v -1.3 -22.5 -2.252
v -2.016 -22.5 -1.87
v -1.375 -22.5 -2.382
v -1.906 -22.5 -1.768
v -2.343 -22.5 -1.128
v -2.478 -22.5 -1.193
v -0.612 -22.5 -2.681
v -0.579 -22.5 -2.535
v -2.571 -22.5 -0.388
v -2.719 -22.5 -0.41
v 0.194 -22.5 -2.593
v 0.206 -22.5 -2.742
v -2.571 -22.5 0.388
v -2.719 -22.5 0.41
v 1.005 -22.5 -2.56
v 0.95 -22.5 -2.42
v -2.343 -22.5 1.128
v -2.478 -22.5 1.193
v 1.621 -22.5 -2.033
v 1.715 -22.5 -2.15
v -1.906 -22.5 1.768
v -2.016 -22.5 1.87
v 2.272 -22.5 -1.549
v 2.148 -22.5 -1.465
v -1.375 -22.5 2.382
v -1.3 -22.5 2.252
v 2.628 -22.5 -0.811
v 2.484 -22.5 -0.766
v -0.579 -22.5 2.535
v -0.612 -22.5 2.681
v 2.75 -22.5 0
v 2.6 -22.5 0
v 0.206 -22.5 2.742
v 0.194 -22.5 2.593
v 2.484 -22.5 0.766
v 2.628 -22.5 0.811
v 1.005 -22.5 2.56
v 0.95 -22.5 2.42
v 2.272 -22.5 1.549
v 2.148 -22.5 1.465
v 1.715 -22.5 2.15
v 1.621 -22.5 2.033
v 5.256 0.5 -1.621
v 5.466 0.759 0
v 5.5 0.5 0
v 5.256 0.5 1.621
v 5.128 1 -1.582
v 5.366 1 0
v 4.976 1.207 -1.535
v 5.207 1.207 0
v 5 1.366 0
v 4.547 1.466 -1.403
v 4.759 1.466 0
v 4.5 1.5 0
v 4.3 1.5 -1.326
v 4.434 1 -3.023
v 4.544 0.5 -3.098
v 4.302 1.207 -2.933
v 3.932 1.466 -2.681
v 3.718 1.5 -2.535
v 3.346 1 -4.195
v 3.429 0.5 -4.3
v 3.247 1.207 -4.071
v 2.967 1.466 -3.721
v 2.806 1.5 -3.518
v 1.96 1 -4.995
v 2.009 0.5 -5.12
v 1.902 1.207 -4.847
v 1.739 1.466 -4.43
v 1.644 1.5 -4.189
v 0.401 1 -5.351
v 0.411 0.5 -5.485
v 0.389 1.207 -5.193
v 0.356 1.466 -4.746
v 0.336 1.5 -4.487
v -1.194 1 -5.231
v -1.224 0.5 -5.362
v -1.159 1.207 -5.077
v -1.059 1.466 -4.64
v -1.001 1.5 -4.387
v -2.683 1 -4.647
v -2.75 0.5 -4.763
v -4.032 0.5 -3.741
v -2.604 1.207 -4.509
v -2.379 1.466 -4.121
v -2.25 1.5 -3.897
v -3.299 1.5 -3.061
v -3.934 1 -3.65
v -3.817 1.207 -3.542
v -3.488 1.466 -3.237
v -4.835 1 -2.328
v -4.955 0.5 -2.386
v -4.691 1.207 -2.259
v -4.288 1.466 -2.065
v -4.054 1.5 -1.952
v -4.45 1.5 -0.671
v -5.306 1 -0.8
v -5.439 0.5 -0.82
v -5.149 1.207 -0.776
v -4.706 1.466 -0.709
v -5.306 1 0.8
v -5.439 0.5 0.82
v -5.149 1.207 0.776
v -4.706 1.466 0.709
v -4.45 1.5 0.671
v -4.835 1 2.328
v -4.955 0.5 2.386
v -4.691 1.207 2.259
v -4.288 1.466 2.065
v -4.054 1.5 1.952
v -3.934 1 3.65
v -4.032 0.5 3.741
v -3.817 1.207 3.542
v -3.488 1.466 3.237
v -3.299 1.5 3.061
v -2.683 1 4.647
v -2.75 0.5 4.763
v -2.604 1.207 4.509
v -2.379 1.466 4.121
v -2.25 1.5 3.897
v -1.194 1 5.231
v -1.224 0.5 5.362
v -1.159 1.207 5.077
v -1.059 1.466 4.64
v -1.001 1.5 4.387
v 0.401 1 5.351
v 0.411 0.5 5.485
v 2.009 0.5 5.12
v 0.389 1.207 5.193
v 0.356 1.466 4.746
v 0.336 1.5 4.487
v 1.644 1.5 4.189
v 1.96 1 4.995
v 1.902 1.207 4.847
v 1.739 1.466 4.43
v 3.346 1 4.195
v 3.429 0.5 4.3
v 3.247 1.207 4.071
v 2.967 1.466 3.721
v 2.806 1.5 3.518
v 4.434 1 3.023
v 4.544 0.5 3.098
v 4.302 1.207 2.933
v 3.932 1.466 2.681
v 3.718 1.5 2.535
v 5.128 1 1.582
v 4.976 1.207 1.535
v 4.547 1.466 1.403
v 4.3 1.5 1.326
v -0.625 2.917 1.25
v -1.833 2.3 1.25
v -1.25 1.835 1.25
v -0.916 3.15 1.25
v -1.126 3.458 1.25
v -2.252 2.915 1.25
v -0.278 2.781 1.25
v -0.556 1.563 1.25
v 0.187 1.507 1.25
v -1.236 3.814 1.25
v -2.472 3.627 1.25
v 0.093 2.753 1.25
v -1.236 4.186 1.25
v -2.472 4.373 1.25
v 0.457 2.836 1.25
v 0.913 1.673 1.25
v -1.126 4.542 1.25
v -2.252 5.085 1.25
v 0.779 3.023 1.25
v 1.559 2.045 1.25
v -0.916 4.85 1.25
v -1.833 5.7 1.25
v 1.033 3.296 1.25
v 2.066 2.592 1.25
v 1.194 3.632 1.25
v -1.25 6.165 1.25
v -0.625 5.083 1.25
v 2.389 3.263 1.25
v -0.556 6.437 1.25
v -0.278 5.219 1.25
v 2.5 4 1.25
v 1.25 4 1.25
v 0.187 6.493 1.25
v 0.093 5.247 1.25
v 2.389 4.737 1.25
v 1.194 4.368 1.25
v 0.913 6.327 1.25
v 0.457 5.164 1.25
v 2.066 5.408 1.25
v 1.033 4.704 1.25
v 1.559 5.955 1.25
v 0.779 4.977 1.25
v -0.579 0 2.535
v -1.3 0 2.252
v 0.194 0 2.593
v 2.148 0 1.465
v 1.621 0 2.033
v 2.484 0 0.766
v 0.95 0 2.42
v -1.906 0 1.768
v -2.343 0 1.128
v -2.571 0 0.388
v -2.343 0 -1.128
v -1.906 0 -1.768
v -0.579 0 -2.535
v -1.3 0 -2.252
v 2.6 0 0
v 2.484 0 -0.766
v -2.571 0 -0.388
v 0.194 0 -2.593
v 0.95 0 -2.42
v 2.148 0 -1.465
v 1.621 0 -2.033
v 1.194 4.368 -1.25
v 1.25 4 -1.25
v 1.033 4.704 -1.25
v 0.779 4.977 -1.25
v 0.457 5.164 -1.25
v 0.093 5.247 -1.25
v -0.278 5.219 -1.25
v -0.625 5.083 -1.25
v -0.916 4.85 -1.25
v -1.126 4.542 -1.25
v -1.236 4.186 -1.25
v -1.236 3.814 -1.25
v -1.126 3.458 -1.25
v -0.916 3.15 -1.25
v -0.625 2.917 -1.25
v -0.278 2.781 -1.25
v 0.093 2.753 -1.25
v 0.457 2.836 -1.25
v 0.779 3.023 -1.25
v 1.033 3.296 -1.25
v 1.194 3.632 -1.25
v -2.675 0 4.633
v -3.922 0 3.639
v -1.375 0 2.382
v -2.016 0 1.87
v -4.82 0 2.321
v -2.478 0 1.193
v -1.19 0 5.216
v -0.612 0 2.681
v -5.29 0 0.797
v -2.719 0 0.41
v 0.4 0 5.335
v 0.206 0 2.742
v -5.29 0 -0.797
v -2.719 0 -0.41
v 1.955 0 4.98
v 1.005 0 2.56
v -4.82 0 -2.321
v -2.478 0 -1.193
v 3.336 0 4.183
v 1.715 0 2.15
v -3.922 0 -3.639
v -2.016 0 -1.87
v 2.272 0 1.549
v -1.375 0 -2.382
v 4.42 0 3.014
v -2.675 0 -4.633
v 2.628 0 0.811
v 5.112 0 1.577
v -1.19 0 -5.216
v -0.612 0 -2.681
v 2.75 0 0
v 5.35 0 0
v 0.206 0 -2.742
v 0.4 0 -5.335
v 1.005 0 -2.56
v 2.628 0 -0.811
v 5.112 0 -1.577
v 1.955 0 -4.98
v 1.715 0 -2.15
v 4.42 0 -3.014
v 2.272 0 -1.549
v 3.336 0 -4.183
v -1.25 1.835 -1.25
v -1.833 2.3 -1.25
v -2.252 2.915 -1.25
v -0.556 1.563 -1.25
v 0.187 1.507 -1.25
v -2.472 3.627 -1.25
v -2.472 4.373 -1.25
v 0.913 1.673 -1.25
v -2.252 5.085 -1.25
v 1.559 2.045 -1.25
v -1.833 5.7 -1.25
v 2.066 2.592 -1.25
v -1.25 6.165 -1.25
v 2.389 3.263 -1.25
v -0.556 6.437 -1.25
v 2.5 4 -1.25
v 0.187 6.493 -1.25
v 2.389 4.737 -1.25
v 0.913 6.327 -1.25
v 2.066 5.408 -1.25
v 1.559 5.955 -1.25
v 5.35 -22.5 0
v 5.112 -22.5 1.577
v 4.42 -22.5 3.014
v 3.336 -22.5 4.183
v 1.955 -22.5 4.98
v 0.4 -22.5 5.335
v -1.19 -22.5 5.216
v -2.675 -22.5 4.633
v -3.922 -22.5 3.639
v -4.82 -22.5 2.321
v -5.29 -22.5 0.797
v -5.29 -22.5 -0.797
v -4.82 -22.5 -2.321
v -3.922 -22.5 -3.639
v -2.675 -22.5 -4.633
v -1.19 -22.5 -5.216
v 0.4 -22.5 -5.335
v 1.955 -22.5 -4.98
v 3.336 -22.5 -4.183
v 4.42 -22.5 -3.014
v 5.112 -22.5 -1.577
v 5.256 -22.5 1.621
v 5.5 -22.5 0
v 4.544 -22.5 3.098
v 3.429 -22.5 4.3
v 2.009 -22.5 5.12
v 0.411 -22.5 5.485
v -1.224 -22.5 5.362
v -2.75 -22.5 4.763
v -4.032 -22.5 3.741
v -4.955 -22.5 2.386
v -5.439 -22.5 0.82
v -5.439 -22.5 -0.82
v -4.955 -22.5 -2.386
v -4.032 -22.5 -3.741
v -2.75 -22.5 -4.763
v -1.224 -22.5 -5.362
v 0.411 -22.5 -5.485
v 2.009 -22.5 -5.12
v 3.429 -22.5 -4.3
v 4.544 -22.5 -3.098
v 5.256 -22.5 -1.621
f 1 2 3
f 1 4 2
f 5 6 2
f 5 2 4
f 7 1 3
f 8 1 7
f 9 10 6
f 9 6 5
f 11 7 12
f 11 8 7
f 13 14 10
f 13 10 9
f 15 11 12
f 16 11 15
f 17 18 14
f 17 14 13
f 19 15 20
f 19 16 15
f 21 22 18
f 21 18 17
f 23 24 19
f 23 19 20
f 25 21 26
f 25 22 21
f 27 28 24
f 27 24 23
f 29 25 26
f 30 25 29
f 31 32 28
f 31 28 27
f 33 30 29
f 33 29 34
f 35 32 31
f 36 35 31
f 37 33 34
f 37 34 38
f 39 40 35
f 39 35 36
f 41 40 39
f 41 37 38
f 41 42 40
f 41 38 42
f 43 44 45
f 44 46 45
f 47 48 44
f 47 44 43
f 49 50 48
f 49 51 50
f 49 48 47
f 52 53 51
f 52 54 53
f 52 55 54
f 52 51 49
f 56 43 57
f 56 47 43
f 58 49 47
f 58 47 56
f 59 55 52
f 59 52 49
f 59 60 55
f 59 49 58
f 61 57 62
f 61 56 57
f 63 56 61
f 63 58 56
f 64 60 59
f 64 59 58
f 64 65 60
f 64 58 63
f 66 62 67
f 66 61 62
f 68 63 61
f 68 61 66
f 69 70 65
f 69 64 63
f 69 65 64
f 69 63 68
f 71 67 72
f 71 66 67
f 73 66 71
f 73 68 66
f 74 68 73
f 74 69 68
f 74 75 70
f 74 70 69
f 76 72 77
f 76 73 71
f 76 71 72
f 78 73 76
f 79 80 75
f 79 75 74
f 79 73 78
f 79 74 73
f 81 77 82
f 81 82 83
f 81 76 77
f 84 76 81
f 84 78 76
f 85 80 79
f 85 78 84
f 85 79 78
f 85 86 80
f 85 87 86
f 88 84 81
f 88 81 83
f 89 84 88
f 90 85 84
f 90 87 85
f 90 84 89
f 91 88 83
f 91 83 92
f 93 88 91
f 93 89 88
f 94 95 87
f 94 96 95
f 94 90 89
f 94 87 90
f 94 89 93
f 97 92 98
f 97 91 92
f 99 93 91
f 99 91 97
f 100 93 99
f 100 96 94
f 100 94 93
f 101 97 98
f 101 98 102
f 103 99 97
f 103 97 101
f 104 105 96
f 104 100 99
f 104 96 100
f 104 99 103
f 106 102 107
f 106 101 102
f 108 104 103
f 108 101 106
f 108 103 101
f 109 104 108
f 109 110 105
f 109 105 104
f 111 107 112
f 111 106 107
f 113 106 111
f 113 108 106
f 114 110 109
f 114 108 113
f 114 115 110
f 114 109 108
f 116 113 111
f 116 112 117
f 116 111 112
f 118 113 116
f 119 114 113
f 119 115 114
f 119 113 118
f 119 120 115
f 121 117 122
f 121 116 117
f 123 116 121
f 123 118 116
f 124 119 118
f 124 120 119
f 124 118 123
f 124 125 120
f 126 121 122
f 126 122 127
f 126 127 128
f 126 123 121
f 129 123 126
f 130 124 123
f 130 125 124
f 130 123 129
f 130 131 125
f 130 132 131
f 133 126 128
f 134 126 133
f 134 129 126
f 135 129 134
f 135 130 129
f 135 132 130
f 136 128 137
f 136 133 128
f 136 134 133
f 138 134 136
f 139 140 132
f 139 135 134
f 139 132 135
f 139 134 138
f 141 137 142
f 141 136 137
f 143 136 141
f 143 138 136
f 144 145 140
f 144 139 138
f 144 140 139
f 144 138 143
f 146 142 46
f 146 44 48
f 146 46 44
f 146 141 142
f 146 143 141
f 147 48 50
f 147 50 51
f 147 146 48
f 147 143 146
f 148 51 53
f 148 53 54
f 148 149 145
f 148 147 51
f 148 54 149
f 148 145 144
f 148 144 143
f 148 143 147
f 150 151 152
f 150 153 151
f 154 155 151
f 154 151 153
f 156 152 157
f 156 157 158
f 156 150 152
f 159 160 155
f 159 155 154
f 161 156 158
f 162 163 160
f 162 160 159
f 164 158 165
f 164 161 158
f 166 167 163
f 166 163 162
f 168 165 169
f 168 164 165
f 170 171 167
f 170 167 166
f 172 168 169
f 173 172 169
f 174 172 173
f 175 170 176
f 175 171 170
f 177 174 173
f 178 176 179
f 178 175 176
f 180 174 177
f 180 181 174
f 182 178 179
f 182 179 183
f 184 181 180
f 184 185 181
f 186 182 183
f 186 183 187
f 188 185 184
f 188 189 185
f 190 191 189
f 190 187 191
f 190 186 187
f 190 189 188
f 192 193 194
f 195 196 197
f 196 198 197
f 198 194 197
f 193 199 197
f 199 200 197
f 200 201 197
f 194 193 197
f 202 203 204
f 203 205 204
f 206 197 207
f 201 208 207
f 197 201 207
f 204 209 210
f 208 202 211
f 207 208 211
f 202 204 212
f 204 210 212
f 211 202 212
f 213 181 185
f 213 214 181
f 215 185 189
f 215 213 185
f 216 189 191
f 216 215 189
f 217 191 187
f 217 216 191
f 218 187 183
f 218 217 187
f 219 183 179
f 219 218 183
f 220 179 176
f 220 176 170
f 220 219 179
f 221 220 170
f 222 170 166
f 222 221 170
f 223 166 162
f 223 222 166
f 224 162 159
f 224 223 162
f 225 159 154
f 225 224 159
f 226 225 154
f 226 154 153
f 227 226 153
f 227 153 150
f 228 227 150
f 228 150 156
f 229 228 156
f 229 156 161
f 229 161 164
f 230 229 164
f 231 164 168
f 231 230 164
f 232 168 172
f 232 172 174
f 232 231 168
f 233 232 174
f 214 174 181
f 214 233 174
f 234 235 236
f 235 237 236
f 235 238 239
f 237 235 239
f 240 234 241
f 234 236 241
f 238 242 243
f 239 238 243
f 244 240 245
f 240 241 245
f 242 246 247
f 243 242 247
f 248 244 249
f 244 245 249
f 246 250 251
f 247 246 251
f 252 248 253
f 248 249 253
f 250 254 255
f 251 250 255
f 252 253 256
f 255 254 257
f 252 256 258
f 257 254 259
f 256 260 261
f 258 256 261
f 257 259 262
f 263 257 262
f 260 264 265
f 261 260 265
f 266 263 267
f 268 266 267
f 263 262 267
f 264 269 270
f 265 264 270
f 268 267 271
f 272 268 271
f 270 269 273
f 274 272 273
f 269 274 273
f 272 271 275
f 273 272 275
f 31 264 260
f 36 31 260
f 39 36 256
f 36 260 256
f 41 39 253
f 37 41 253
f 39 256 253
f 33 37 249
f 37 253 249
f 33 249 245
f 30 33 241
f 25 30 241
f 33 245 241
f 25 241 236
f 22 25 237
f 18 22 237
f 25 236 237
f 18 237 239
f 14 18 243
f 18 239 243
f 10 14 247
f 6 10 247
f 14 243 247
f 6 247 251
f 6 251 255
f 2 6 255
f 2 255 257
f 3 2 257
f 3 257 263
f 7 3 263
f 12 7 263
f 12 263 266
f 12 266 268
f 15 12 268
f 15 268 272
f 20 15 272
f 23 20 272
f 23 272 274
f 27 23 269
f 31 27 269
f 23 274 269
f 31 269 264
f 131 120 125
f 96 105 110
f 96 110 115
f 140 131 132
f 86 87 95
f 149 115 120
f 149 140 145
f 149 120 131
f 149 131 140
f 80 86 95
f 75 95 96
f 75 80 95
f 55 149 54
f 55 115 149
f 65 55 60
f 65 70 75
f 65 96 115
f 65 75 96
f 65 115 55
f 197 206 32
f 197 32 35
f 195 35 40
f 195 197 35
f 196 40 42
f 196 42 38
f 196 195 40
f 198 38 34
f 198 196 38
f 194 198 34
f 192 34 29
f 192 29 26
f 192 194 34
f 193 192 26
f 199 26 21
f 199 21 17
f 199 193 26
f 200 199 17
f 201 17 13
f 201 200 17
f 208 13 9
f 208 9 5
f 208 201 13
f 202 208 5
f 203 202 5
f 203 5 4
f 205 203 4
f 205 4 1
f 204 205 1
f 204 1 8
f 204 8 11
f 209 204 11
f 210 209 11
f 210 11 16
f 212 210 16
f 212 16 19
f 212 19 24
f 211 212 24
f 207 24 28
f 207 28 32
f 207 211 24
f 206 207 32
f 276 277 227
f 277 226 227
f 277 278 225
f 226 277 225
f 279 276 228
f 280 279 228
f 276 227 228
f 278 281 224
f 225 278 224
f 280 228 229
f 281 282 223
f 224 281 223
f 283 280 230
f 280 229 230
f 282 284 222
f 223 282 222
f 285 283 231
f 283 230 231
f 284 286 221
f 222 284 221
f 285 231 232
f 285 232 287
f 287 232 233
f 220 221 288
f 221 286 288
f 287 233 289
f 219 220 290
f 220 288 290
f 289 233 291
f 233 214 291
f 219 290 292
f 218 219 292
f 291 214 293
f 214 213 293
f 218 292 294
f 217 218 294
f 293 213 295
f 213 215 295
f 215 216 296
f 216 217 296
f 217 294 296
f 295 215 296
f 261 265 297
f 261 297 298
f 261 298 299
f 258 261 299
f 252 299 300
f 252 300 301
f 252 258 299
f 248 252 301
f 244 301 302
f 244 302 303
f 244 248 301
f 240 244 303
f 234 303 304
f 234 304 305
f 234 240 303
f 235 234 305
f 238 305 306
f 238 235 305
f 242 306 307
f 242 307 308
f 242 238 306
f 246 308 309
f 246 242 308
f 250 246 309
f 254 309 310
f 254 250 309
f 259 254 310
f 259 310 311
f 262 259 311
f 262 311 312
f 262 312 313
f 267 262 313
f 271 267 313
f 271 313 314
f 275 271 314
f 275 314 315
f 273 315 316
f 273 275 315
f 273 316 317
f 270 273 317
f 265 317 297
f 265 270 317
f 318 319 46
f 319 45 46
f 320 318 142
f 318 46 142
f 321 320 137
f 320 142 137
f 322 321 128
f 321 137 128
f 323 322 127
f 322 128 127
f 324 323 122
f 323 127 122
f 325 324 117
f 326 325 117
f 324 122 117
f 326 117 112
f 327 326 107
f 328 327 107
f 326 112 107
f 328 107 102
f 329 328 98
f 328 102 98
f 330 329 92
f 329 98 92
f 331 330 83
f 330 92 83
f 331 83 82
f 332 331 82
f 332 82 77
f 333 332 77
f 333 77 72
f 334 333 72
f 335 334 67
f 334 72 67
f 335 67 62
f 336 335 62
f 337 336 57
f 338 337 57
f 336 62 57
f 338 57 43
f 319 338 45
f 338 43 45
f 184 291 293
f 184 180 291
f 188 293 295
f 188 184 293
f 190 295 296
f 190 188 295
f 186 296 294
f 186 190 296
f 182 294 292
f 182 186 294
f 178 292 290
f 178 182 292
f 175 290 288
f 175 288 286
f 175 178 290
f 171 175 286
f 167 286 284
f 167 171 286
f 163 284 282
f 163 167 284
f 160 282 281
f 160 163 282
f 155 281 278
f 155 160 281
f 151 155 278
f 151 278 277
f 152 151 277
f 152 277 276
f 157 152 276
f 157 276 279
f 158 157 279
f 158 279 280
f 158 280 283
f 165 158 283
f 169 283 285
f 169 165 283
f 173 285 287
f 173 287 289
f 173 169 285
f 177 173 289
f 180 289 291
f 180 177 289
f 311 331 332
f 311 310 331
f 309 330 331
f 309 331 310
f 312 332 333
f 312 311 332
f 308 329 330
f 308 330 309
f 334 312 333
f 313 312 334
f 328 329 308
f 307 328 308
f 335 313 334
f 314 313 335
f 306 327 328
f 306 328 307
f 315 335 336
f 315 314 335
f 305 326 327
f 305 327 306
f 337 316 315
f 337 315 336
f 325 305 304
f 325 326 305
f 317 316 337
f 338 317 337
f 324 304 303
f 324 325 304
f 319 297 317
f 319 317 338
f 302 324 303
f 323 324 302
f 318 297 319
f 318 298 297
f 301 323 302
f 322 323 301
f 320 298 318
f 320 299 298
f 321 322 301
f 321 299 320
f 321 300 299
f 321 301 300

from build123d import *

# Parameters (mm, degrees)
SKETCH1_R           = 5.5
BOSS_EXTRUDE1_DEPTH = 1.5
SKETCH2_R           = 2.5
SKETCH2_R_2         = 1.25
BOSS_EXTRUDE2_DEPTH = 1.25
FILLET1_R           = 1
SKETCH3_R           = 5.5
SKETCH3_R_2         = 5.35
BOSS_EXTRUDE3_DEPTH = 22.5
SKETCH4_R           = 2.75
SKETCH4_R_2         = 2.6
BOSS_EXTRUDE4_DEPTH = 22.5


with BuildPart() as part:
    # Sketch1 → Boss-Extrude1 (new body)
    with BuildSketch(Plane(origin=(0, 0, 0), x_dir=(1, 0, 0), z_dir=(0, 1, 0))):
        Circle(SKETCH1_R)
    extrude(amount=BOSS_EXTRUDE1_DEPTH)

    # Fillet1
    fillet1_edges = [part.edges().sort_by_distance(p)[0] for p in [
        (-5.5, 1.5, 0),
    ]]
    fillet(fillet1_edges, radius=FILLET1_R)

    # Sketch3 → Boss-Extrude3 (add)
    with BuildSketch(Plane.XZ):
        Circle(SKETCH3_R)
        Circle(SKETCH3_R_2, mode=Mode.SUBTRACT)
    extrude(amount=BOSS_EXTRUDE3_DEPTH)

    # Sketch4 → Boss-Extrude4 (add)
    with BuildSketch(Plane.XZ):
        Circle(SKETCH4_R)
        Circle(SKETCH4_R_2, mode=Mode.SUBTRACT)
    extrude(amount=BOSS_EXTRUDE4_DEPTH)


with BuildPart() as body_2:
    # Sketch2 → Boss-Extrude2 (new body, symmetric)
    with BuildSketch(Plane.XY):
        with Locations((0, 4)):
            Circle(SKETCH2_R)
        with Locations((0, 4)):
            Circle(SKETCH2_R_2, mode=Mode.SUBTRACT)
    extrude(amount=BOSS_EXTRUDE2_DEPTH, both=True)


solid = Compound([part.part, body_2.part])
